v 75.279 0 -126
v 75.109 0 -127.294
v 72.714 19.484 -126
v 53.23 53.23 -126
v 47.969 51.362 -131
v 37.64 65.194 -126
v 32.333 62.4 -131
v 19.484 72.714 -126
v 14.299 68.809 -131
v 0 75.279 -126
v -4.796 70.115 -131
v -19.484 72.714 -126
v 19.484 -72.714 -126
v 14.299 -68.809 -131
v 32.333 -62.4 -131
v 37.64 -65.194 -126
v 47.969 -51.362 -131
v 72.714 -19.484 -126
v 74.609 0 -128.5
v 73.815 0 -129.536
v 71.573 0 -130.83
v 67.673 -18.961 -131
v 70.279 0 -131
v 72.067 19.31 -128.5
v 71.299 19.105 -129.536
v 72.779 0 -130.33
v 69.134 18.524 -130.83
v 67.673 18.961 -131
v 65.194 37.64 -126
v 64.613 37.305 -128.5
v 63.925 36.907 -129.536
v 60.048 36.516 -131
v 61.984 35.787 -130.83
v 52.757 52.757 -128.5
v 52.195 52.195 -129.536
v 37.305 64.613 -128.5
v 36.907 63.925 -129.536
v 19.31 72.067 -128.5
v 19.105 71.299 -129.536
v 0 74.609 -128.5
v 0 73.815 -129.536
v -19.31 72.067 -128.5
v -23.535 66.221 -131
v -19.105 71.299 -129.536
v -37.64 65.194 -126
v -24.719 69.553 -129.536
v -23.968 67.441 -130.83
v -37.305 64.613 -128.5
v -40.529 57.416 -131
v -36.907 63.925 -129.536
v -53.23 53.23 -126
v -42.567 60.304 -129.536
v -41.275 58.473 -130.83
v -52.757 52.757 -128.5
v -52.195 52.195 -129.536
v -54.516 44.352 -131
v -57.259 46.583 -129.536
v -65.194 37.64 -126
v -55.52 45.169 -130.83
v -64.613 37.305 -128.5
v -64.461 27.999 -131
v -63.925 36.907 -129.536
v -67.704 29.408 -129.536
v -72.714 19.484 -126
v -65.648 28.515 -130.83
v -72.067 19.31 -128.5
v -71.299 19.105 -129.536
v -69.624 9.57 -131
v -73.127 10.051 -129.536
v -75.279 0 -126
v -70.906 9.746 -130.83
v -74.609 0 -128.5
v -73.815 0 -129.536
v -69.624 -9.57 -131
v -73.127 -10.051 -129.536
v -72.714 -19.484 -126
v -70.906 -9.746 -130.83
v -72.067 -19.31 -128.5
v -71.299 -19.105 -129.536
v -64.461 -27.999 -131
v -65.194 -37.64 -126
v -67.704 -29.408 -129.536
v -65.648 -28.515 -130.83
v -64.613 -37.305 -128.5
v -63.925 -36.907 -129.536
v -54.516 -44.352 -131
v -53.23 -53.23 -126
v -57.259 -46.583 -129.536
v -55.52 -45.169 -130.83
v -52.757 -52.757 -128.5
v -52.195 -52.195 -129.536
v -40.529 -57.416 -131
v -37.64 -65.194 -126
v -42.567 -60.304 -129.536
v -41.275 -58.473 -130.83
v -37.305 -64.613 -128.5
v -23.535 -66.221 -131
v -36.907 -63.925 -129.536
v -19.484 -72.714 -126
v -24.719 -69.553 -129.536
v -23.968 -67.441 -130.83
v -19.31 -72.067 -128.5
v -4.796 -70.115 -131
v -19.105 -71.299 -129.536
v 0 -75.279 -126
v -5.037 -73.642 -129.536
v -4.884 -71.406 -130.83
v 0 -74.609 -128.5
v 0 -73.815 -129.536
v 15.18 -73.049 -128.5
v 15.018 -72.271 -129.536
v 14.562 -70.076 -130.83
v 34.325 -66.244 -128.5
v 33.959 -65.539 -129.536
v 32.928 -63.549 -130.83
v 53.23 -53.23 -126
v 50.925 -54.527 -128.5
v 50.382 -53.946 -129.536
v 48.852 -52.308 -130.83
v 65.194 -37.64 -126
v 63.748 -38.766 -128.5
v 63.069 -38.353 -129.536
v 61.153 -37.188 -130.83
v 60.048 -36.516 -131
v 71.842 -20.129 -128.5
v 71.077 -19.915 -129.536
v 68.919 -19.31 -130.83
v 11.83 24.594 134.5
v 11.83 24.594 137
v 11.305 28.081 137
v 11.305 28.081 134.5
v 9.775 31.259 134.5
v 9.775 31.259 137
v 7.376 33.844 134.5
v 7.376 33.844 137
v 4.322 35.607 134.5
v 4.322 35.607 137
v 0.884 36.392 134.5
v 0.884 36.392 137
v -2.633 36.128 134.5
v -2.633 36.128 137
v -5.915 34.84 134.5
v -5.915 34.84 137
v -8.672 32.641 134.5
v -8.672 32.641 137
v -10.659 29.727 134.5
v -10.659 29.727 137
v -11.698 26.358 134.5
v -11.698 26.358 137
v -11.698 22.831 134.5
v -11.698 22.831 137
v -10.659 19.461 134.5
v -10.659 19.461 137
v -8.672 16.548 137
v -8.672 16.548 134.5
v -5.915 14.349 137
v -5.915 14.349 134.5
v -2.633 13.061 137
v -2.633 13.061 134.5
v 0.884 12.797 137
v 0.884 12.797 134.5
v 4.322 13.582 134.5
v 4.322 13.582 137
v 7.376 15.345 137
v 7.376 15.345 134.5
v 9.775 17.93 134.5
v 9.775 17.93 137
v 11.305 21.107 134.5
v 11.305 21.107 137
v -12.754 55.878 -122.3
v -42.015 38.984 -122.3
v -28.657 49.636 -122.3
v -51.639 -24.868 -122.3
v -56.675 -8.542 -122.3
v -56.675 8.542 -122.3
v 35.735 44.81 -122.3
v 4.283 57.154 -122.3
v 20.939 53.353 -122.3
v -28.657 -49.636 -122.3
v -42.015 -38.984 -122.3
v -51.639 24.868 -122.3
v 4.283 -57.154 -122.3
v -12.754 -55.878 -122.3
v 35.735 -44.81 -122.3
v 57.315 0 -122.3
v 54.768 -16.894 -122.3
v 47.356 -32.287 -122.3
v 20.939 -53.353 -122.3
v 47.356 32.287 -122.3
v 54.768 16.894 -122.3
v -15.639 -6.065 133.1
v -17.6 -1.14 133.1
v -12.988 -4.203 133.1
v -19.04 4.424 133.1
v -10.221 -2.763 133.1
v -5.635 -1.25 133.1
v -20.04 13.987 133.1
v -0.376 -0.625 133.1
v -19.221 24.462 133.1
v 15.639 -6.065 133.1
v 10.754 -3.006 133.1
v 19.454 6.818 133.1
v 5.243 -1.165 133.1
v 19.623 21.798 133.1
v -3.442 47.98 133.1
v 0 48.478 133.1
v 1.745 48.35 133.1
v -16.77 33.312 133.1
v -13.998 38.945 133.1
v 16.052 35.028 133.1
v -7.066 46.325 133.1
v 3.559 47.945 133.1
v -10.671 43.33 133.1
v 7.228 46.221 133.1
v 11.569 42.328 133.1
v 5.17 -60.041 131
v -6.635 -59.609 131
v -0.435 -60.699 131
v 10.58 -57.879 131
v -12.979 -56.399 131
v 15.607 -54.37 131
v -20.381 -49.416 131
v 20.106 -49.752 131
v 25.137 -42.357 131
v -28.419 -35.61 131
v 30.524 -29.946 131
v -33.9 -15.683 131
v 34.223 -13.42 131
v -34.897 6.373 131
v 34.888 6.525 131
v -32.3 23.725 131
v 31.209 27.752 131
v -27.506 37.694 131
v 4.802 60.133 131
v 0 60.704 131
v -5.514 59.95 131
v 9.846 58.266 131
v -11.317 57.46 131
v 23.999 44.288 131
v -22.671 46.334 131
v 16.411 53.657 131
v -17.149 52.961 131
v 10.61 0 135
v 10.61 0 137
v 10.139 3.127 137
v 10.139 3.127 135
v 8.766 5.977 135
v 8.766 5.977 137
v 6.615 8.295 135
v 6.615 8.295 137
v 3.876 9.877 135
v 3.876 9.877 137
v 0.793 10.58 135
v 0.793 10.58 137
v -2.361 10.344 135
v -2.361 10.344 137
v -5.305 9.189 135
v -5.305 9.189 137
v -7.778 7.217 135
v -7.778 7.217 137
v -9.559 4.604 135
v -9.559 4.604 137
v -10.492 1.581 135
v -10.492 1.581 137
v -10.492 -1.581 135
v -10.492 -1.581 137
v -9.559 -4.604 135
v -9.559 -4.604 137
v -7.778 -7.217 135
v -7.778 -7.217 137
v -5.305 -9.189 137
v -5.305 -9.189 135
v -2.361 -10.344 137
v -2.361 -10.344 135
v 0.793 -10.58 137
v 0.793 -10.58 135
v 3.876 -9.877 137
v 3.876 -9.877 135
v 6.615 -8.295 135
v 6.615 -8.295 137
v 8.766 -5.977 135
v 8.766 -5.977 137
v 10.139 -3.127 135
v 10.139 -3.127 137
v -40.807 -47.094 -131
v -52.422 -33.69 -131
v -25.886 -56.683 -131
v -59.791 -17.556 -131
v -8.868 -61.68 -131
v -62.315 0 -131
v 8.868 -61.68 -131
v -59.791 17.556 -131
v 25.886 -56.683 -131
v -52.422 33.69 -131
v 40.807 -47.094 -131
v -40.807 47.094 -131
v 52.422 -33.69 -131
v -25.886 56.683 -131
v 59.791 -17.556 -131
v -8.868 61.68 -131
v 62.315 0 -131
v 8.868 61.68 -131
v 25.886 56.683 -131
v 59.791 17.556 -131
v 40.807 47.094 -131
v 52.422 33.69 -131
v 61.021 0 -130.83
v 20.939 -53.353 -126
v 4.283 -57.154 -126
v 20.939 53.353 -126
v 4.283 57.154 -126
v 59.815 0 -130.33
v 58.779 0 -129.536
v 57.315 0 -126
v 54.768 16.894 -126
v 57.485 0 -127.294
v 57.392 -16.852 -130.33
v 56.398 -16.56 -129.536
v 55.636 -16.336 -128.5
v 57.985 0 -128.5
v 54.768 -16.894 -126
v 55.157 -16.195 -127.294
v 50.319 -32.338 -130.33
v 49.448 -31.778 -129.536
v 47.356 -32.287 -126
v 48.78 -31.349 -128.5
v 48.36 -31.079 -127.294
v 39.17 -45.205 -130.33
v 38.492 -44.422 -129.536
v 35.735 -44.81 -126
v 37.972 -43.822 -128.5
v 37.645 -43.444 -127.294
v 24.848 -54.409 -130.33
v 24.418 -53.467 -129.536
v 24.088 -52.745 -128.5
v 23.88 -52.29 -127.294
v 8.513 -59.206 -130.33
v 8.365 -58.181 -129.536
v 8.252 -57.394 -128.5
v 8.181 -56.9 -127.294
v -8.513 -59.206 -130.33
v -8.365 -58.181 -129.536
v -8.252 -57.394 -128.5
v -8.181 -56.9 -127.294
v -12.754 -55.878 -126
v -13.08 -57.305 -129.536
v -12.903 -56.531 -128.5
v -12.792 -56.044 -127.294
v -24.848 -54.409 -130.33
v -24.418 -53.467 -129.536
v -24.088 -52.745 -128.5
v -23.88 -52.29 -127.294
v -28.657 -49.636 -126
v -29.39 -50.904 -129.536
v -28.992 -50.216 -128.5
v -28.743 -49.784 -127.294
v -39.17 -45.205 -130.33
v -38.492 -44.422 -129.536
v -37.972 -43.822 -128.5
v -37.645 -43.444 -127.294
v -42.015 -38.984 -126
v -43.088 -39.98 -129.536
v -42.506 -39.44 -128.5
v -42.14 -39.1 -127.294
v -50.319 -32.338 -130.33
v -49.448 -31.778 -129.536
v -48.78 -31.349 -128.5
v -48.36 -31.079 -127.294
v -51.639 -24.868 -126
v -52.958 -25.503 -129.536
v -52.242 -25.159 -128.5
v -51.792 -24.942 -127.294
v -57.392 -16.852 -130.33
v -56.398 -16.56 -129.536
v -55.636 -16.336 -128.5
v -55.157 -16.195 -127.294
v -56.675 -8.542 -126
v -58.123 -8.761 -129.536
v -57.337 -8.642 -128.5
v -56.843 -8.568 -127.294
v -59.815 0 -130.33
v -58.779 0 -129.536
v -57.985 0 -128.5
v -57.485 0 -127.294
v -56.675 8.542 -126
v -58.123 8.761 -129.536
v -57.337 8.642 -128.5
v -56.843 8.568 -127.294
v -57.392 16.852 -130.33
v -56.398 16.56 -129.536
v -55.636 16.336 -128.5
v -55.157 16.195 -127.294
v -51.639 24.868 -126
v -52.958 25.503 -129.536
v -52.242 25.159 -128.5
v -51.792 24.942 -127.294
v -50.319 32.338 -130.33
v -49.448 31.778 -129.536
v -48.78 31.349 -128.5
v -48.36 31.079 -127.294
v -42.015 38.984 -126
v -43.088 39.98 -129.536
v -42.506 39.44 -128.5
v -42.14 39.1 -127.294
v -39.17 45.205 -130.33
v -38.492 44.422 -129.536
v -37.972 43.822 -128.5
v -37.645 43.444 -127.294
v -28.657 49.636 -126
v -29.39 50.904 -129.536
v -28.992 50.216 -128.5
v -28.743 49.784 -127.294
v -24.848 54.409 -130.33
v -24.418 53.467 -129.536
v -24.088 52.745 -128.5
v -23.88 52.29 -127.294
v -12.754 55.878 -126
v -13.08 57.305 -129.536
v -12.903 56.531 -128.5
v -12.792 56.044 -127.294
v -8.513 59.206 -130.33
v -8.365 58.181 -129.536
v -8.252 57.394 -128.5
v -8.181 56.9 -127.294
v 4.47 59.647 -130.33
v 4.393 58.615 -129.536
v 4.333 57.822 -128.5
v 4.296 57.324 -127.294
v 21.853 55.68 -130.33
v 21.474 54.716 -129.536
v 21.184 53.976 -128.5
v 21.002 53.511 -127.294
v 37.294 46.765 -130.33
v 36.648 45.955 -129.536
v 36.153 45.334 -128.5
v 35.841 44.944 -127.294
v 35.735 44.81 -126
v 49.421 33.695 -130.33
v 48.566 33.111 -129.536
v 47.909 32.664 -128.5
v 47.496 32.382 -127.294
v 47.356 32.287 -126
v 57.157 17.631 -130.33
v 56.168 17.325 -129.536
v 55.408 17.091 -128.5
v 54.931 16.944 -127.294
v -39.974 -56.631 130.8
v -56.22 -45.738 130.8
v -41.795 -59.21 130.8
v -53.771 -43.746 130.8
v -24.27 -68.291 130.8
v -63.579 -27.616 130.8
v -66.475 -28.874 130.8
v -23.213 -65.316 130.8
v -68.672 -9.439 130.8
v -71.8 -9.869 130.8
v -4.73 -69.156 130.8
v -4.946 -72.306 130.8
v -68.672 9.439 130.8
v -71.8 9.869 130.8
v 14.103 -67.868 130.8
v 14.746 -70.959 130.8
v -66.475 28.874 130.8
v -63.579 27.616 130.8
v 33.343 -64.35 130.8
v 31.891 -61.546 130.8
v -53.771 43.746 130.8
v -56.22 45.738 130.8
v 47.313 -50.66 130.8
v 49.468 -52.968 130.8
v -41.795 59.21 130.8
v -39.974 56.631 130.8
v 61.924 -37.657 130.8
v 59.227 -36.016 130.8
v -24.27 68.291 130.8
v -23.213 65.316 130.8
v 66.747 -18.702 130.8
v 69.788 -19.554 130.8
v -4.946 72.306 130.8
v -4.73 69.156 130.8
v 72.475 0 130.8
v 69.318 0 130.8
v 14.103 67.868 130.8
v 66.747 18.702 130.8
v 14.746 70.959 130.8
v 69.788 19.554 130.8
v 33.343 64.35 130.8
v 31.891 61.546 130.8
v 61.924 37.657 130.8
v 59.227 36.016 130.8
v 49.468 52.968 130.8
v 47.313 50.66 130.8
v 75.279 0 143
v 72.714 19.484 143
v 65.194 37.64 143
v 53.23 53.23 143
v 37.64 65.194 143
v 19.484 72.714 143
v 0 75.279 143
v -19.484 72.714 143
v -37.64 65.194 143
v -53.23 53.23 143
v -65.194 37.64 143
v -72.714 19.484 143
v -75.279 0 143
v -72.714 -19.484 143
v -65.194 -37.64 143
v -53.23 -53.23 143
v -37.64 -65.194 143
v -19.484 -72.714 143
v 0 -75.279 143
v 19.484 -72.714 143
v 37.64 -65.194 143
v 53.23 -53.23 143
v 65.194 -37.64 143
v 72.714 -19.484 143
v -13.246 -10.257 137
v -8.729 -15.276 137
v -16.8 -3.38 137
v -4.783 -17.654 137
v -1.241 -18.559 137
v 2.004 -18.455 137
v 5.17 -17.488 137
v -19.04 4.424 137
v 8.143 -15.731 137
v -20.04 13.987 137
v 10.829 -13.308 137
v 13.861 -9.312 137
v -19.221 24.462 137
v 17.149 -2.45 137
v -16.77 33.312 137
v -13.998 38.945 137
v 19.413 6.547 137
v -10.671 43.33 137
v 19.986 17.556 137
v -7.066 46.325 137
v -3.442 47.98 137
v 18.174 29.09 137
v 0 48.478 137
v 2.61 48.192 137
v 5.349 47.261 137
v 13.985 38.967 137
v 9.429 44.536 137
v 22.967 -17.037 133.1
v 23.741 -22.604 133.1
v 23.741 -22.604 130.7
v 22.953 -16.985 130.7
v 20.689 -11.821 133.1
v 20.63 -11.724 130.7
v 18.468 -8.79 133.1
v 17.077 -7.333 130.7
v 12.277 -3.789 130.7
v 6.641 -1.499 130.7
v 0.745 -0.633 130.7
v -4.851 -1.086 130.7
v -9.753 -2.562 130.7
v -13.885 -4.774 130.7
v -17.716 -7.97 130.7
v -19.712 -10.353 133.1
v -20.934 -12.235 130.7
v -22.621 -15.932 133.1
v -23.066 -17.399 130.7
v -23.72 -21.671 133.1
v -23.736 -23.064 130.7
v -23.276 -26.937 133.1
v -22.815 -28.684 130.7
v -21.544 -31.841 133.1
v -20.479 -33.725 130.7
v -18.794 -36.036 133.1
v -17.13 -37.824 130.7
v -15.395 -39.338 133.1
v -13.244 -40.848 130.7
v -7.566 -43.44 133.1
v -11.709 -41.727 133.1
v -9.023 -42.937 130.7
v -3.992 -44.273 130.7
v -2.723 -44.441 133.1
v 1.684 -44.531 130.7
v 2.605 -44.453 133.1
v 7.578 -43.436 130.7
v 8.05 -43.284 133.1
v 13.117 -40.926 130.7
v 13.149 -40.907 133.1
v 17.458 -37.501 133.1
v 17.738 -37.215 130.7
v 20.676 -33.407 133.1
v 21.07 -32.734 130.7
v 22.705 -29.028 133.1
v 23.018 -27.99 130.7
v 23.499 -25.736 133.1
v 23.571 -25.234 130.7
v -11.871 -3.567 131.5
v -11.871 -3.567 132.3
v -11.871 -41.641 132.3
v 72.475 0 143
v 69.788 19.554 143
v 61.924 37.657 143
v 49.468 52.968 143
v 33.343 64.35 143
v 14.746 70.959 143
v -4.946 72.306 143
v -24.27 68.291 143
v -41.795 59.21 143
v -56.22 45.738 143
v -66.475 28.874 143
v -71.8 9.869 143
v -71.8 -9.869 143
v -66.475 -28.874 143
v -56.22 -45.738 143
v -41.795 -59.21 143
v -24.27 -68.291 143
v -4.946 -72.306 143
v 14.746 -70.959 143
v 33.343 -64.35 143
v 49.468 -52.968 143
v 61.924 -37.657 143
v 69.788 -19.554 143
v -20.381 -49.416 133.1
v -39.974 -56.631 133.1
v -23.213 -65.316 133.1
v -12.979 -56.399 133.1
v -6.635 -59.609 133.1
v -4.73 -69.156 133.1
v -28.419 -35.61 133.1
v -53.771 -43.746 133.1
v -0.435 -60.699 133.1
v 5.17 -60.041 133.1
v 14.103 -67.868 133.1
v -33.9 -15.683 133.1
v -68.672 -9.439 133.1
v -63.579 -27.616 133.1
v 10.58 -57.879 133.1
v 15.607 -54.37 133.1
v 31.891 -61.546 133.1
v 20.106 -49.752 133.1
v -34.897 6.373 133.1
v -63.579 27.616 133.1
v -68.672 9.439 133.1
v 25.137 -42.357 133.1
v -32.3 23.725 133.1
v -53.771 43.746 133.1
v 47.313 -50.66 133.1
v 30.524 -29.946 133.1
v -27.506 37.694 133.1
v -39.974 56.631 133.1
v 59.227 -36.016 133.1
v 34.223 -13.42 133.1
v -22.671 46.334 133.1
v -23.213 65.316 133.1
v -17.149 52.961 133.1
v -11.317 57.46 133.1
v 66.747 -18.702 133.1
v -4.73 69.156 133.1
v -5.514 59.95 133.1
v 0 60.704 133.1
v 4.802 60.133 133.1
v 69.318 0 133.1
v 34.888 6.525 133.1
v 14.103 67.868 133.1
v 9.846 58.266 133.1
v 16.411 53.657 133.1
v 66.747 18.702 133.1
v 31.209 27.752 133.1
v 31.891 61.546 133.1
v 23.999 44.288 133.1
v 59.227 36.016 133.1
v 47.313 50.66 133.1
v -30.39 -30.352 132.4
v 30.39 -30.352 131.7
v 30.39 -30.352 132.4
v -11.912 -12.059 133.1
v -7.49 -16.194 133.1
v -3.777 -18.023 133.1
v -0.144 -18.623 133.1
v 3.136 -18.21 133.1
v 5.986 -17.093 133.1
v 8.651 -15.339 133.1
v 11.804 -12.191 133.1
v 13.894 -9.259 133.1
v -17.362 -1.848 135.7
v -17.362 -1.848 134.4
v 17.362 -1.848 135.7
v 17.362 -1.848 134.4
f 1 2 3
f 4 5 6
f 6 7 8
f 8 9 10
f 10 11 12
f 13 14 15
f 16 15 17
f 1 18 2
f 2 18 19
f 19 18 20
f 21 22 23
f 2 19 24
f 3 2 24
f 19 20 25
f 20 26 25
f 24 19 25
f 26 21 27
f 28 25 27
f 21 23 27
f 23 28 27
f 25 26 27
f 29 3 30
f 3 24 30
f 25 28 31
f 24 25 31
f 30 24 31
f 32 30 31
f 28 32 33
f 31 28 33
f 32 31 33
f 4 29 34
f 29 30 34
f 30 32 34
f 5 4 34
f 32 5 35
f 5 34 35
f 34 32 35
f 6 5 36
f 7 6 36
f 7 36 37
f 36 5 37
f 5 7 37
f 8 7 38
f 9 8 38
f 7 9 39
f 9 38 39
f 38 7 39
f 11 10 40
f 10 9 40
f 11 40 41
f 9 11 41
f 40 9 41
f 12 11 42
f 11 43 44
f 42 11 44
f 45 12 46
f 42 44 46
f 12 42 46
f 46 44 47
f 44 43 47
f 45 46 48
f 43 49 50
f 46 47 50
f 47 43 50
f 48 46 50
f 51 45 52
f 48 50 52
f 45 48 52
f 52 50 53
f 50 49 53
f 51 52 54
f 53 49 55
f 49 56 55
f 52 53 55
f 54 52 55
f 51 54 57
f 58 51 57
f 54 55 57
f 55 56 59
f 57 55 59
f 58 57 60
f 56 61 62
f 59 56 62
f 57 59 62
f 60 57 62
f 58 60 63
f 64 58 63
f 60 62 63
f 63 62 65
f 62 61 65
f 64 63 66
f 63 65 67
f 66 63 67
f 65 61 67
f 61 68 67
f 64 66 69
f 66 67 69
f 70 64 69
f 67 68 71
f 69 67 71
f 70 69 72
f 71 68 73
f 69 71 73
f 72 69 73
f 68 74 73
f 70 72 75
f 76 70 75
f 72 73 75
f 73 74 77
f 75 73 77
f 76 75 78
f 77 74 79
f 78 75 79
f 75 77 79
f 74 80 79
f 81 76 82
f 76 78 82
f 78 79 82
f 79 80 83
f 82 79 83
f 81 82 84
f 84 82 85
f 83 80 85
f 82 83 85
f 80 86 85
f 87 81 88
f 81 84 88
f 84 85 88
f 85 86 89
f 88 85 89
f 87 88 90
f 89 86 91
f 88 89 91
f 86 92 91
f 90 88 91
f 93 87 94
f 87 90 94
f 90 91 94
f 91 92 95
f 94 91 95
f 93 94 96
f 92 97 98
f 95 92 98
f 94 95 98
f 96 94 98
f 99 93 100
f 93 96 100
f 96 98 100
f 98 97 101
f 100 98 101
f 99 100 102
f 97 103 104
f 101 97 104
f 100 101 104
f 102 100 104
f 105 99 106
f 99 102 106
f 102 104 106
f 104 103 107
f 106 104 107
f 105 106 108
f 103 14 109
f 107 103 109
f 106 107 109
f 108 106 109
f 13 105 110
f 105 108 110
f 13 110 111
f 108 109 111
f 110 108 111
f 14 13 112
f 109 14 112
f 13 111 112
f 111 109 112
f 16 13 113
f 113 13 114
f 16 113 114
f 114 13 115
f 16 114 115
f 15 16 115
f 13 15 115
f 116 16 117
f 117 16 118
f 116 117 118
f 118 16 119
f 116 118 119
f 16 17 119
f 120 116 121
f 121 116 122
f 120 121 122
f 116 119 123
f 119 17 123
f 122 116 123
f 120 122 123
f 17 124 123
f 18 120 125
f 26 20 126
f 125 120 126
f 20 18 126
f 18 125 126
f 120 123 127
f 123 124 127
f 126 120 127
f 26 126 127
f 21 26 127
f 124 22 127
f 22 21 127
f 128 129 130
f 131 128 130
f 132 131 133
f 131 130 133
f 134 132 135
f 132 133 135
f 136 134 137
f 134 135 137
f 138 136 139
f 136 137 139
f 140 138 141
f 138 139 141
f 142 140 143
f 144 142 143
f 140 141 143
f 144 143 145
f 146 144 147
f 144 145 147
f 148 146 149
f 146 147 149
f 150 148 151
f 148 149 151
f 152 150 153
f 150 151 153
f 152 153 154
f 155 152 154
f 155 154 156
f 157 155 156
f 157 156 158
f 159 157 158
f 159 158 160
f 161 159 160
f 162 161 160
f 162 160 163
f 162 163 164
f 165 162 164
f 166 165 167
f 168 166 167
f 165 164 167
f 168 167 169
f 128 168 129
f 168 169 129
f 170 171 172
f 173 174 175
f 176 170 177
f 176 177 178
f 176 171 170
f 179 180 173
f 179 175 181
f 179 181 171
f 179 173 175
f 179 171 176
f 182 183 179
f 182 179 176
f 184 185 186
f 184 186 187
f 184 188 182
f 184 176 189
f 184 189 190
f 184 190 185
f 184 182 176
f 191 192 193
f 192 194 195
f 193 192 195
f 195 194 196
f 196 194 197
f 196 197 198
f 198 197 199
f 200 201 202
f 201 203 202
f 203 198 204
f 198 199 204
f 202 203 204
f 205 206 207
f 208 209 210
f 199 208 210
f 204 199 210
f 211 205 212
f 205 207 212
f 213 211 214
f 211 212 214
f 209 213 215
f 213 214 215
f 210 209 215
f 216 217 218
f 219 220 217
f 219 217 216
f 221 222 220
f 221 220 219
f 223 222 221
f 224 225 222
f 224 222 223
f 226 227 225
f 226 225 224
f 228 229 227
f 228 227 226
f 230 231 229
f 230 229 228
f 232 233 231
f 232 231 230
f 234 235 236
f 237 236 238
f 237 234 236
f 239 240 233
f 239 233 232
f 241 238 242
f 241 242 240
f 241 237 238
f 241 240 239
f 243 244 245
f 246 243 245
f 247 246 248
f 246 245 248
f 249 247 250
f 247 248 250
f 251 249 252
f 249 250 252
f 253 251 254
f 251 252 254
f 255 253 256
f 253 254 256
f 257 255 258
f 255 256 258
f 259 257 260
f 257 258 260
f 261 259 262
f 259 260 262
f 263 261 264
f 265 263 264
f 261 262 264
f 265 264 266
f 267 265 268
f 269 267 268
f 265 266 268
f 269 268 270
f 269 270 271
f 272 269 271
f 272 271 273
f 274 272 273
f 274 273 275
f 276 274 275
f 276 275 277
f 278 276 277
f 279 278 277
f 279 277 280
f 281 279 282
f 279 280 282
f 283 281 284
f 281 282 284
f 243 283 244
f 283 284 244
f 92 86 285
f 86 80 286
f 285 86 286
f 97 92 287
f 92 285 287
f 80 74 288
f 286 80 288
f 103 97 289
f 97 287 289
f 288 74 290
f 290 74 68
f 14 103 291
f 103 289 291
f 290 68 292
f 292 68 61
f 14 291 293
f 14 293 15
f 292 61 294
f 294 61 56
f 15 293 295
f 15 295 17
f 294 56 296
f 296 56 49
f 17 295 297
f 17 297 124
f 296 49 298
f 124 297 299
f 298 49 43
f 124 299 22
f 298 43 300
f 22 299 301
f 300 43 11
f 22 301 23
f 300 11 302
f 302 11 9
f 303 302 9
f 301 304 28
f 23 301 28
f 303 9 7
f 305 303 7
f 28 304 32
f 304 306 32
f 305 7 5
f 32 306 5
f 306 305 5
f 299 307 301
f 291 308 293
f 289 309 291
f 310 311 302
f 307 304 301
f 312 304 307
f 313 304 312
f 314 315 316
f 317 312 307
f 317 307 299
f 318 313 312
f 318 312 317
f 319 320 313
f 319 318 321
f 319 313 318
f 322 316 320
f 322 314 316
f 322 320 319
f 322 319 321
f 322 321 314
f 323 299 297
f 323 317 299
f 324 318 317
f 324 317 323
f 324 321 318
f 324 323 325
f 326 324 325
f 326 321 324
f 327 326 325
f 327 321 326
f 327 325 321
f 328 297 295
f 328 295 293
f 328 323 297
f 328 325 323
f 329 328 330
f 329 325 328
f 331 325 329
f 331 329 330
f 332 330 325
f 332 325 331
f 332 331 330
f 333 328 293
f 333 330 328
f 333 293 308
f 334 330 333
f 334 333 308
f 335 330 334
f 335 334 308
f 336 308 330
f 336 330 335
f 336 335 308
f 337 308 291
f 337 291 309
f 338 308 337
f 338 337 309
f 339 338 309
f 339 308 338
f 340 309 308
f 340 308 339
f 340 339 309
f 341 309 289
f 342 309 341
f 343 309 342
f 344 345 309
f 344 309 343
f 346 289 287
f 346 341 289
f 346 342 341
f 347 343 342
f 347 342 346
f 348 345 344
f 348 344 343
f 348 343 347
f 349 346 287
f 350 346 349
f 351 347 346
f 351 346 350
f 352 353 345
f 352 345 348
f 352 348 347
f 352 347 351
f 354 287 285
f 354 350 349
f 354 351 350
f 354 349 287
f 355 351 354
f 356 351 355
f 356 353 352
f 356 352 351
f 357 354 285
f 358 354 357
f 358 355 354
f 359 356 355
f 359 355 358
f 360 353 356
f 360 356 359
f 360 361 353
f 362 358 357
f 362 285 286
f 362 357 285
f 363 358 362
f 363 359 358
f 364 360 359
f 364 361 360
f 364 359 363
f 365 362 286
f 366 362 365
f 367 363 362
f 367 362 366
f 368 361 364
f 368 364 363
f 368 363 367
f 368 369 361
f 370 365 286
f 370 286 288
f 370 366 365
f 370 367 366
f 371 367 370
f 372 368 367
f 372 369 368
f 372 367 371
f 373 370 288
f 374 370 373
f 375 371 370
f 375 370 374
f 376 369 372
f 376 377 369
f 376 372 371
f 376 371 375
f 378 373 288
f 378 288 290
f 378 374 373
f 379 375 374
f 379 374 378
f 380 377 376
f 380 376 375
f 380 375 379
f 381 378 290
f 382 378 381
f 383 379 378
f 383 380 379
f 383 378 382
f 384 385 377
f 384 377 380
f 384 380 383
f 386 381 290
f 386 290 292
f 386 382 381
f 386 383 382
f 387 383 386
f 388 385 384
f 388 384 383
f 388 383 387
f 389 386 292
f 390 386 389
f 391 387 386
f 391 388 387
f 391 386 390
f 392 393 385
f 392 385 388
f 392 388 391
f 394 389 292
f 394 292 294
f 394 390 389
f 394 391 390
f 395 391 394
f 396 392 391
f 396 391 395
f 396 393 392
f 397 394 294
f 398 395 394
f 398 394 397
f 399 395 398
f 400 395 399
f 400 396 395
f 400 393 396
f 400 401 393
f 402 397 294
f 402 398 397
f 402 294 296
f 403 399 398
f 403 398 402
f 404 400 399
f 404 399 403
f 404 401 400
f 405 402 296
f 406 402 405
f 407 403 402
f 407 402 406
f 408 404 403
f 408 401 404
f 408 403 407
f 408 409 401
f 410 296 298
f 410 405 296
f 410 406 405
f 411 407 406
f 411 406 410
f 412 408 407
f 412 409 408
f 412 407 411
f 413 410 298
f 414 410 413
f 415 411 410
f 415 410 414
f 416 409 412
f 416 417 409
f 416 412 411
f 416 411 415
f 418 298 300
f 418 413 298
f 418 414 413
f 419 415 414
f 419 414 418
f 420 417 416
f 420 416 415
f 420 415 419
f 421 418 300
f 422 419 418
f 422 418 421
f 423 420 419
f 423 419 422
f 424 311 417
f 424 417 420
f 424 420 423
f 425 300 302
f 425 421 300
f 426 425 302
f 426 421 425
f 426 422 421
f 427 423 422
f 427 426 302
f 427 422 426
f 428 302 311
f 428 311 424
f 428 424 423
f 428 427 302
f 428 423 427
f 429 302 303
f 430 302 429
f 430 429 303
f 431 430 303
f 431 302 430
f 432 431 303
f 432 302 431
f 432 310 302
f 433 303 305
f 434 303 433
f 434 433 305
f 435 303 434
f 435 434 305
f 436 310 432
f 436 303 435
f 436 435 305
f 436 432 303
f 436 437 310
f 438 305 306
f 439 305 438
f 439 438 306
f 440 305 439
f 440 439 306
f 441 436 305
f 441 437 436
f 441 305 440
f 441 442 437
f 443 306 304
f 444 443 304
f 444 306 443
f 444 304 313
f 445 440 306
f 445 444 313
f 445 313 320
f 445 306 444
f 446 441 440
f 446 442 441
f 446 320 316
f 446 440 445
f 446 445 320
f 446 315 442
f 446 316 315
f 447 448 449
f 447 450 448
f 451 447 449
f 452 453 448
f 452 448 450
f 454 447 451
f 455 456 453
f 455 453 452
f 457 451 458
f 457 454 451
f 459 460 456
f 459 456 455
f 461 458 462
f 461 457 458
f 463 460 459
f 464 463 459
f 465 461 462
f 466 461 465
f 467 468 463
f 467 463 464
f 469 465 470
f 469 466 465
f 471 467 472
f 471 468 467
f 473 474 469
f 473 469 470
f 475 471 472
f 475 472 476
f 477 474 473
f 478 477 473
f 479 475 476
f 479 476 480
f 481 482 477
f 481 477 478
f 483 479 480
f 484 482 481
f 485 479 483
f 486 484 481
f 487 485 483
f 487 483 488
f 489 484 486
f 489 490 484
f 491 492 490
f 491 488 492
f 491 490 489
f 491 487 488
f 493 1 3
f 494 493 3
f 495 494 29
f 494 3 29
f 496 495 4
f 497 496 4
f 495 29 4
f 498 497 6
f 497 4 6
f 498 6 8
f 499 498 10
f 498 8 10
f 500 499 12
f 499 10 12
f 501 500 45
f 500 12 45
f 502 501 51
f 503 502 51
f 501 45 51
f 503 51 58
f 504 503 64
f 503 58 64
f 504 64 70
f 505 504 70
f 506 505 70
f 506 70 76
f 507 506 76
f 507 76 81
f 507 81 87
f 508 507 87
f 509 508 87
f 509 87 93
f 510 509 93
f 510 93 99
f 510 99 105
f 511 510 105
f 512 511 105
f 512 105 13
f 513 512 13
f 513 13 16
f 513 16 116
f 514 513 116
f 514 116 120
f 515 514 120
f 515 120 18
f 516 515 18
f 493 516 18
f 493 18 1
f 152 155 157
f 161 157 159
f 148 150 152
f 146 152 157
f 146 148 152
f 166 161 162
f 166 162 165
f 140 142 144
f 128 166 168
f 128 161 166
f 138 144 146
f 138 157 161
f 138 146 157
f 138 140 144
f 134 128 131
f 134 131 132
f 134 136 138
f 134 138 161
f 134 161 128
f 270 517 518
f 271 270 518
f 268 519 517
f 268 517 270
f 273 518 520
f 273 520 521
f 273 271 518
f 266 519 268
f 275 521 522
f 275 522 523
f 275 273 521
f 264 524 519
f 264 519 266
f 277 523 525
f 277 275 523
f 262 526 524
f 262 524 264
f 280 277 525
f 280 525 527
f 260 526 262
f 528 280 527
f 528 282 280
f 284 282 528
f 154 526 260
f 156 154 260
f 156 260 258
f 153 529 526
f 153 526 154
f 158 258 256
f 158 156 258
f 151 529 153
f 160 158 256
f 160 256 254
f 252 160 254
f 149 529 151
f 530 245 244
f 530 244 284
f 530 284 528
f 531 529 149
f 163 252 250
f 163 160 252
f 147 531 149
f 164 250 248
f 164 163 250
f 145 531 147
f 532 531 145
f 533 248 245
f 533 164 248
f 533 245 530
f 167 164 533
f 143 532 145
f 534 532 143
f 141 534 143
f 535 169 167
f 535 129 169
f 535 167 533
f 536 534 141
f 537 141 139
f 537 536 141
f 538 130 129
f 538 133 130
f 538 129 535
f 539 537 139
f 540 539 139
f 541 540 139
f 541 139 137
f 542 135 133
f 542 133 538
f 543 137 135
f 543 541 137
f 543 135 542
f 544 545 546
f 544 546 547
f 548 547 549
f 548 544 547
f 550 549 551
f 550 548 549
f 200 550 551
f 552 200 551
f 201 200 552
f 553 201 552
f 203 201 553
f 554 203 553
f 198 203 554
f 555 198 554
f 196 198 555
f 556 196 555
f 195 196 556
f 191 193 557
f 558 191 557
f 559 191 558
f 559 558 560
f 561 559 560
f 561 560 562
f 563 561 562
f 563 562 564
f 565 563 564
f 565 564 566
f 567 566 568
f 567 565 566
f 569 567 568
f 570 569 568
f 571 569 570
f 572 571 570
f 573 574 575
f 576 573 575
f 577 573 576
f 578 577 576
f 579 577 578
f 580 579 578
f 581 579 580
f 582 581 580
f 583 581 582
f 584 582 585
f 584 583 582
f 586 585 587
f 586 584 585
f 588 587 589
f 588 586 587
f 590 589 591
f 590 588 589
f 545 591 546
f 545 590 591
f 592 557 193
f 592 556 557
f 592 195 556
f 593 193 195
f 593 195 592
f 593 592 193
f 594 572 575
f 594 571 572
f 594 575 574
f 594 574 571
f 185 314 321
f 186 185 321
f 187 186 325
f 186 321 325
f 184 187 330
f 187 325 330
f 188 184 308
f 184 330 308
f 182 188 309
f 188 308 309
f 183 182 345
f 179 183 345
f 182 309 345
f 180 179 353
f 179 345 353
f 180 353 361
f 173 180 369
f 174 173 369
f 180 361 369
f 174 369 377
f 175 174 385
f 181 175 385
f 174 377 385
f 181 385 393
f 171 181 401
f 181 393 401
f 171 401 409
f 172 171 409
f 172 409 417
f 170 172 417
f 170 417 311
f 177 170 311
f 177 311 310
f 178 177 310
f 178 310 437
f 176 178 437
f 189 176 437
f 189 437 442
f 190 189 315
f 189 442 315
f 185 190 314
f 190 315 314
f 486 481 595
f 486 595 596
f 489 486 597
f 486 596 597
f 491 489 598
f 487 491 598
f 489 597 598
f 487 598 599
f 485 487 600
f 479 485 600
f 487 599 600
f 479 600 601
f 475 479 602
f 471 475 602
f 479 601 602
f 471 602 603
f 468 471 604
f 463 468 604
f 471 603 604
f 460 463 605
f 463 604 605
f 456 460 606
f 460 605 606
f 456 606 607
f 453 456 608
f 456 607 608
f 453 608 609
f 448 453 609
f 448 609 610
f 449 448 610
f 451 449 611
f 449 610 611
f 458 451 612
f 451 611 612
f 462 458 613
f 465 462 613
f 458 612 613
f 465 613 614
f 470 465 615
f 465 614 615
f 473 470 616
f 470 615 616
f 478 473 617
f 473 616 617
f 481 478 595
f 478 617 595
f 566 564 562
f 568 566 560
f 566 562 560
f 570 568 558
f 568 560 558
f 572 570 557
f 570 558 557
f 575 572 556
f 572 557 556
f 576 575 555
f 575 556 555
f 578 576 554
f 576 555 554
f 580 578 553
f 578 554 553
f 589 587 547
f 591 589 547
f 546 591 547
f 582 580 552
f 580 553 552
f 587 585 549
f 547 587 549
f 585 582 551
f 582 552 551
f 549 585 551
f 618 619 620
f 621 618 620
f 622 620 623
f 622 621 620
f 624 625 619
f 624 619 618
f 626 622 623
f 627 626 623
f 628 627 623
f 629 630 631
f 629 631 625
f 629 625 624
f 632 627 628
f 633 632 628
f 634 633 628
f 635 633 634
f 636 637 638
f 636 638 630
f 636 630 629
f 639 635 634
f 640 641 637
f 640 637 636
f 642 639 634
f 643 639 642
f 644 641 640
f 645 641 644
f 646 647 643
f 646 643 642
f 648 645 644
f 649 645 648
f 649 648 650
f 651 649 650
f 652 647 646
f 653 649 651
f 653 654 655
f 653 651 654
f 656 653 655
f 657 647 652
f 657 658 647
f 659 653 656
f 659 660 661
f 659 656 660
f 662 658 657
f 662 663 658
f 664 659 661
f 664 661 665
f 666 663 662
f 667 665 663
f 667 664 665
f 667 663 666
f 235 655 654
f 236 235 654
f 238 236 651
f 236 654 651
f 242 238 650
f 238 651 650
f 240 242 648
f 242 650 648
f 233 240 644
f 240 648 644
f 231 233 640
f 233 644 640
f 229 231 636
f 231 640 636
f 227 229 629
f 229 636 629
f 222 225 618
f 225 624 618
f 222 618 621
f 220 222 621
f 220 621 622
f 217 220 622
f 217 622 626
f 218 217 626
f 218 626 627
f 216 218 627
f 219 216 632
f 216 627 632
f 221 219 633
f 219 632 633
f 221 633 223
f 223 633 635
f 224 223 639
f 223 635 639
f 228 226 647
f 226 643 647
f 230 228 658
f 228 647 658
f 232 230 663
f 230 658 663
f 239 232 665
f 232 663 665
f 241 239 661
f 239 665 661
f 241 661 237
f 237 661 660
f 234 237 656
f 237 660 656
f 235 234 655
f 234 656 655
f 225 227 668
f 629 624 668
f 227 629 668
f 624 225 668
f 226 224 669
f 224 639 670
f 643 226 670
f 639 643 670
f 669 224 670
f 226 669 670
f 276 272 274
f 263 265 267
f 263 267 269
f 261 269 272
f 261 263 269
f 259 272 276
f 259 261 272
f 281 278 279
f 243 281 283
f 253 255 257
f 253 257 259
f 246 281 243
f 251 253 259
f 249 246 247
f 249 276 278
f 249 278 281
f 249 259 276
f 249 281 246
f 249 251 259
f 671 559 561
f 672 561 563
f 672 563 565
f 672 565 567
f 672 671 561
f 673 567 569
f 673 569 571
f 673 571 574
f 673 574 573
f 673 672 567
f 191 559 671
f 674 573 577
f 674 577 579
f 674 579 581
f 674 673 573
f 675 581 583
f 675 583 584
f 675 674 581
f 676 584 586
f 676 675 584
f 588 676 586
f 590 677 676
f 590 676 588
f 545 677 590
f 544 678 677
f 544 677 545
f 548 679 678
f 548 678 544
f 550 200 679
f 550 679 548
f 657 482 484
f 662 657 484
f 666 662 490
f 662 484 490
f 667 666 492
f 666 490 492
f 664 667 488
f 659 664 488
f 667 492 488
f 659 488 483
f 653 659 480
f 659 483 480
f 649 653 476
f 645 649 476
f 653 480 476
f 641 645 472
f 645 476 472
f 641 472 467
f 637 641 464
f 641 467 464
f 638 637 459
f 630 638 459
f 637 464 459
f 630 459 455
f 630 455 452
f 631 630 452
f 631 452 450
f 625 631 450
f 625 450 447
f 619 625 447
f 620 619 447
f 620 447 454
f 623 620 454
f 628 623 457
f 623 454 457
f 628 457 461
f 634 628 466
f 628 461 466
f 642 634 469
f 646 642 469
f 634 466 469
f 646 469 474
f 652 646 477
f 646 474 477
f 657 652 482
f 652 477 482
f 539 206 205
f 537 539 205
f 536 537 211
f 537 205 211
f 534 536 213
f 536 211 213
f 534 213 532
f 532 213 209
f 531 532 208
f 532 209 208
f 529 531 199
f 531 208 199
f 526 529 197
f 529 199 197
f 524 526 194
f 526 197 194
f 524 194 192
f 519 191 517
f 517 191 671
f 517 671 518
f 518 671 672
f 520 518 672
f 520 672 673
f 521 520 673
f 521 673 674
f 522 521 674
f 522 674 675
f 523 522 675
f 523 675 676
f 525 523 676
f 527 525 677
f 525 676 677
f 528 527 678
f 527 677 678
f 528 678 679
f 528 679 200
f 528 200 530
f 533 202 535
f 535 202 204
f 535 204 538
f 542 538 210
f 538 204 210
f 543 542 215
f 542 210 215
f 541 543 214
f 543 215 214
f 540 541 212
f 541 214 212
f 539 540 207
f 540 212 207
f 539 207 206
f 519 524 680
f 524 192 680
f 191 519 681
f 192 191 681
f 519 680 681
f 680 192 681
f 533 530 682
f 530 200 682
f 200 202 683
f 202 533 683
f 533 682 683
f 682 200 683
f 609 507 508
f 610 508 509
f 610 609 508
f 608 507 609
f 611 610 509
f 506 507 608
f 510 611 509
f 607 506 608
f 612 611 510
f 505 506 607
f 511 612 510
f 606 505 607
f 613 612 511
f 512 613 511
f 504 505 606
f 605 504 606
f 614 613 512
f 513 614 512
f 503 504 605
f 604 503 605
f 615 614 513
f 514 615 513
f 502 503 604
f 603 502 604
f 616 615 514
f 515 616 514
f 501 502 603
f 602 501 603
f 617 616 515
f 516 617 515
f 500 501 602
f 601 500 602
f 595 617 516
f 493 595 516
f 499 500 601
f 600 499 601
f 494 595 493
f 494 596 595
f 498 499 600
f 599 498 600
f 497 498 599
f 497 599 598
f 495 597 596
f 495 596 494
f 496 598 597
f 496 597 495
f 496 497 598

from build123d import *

# Parameters (mm, degrees)
F0_R      = 75.279024749
F1_DEPTH  = 104
F2_DEPTH  = 131
F3_DEPTH  = 39
F4_R      = 72.4752953546
F5_DEPTH  = 12.2
F6_R      = 69.3178574883
F7_DEPTH  = 2.3
F10_DEPTH = 2.1
F12_DEPTH = 3.9
F14_DEPTH = 2.4
F15_R     = 11.830371828
F16_DEPTH = 2.5
F15_R_2   = 10.6100179521
F17_DEPTH = 2
F18_R     = 57.314692
F19_DEPTH = 8.7
F20_R     = 5


with BuildPart() as f1:
    # F0 (on Top) → F1 (new body)
    with BuildSketch(Plane.XY):
        Circle(F0_R)
    extrude(amount=F1_DEPTH)

    # F2 (add): a face of the model
    f2_faces = [f1.faces().sort_by_distance(p)[0] for p in [
        (0, 0, 0),
    ]]
    extrude(f2_faces, amount=F2_DEPTH)

    # F3 (add): a face of the model
    f3_faces = [f1.faces().sort_by_distance(p)[0] for p in [
        (0, 0, 104),
    ]]
    extrude(f3_faces, amount=F3_DEPTH)

    # F4 (on face) → F5 (cut)
    with BuildSketch(Plane.XY.offset(143)):
        Circle(F4_R)
    extrude(amount=-F5_DEPTH, mode=Mode.SUBTRACT)

    # F6 (on face) → F7 (join)
    with BuildSketch(Plane.XY.offset(130.8)):
        Circle(F6_R)
    extrude(amount=F7_DEPTH)

    # F9 (on face) → F10 (cut)
    with BuildSketch(Plane.XY.offset(133.1)):
        with BuildLine():
            add(Edge.make_bspline(
                [(0, 60.7038661838), (-60.7799193233, 60.7038661838), (-30.3899596616, -30.3519330919), (0, -121.4077323675), (30.3899596616, -30.3519330919), (60.7799193233, 60.7038661838), (0, 60.7038661838)],
                knots=[0, 0, 0, 2.0943951024, 2.0943951024, 4.1887902048, 4.1887902048, 6.2831853072, 6.2831853072, 6.2831853072], degree=2, weights=[1, 0.5, 1, 0.5, 1, 0.5, 1]))
        make_face()
    extrude(amount=-F10_DEPTH, mode=Mode.SUBTRACT)

    # F18 (on face) → F19 (cut)
    with BuildSketch(Plane(origin=(0, 0, -131), x_dir=(1, 0, 0), z_dir=(0, 0, -1))):
        Circle(F18_R)
    extrude(amount=-F19_DEPTH, mode=Mode.SUBTRACT)

    # F20
    f20_edges = [f1.edges().sort_by_distance(p)[0] for p in [
        (-75.279025, 0, -131),
        (-57.314692, 0, -131),
    ]]
    fillet(f20_edges, radius=F20_R)


with BuildPart() as f12:
    # F11 (on face) → F12 (new body)
    with BuildSketch(Plane.XY.offset(133.1)):
        with BuildLine():
            add(Edge.make_bspline(
                [(0, 48.477794975), (-34.7240676564, 48.477794975), (-17.3620338282, -1.8481253646), (0, -52.1740457043), (17.3620338282, -1.8481253646), (34.7240676564, 48.477794975), (0, 48.477794975)],
                knots=[0, 0, 0, 2.0943951024, 2.0943951024, 4.1887902048, 4.1887902048, 6.2831853072, 6.2831853072, 6.2831853072], degree=2, weights=[1, 0.5, 1, 0.5, 1, 0.5, 1]))
        make_face()
    extrude(amount=F12_DEPTH)

    # F13 (on face) → F14 (join)
    with BuildSketch(Plane.XY.offset(133.1)):
        with BuildLine():
            add(Edge.make_bspline(
                [(23.7413235009, -22.6040165871), (23.7413235009, 15.470016879), (-11.8706617504, -3.5669998541), (-47.4826470017, -22.6040165871), (-11.8706617504, -41.6410333202), (23.7413235009, -60.6780500532), (23.7413235009, -22.6040165871)],
                knots=[0, 0, 0, 2.0943951024, 2.0943951024, 4.1887902048, 4.1887902048, 6.2831853072, 6.2831853072, 6.2831853072], degree=2, weights=[1, 0.5, 1, 0.5, 1, 0.5, 1]))
        make_face()
    extrude(amount=-F14_DEPTH)

    # F15 (on face) → F16 (cut)
    with BuildSketch(Plane.XY.offset(137)):
        with Locations((0, 24.5943088084)):
            Circle(F15_R)
    extrude(amount=-F16_DEPTH, mode=Mode.SUBTRACT)

    # F15 (on face) → F17 (cut)
    with BuildSketch(Plane.XY.offset(137)):
        Circle(F15_R_2)
    extrude(amount=-F17_DEPTH, mode=Mode.SUBTRACT)


solid = Compound([f1.part, f12.part])
